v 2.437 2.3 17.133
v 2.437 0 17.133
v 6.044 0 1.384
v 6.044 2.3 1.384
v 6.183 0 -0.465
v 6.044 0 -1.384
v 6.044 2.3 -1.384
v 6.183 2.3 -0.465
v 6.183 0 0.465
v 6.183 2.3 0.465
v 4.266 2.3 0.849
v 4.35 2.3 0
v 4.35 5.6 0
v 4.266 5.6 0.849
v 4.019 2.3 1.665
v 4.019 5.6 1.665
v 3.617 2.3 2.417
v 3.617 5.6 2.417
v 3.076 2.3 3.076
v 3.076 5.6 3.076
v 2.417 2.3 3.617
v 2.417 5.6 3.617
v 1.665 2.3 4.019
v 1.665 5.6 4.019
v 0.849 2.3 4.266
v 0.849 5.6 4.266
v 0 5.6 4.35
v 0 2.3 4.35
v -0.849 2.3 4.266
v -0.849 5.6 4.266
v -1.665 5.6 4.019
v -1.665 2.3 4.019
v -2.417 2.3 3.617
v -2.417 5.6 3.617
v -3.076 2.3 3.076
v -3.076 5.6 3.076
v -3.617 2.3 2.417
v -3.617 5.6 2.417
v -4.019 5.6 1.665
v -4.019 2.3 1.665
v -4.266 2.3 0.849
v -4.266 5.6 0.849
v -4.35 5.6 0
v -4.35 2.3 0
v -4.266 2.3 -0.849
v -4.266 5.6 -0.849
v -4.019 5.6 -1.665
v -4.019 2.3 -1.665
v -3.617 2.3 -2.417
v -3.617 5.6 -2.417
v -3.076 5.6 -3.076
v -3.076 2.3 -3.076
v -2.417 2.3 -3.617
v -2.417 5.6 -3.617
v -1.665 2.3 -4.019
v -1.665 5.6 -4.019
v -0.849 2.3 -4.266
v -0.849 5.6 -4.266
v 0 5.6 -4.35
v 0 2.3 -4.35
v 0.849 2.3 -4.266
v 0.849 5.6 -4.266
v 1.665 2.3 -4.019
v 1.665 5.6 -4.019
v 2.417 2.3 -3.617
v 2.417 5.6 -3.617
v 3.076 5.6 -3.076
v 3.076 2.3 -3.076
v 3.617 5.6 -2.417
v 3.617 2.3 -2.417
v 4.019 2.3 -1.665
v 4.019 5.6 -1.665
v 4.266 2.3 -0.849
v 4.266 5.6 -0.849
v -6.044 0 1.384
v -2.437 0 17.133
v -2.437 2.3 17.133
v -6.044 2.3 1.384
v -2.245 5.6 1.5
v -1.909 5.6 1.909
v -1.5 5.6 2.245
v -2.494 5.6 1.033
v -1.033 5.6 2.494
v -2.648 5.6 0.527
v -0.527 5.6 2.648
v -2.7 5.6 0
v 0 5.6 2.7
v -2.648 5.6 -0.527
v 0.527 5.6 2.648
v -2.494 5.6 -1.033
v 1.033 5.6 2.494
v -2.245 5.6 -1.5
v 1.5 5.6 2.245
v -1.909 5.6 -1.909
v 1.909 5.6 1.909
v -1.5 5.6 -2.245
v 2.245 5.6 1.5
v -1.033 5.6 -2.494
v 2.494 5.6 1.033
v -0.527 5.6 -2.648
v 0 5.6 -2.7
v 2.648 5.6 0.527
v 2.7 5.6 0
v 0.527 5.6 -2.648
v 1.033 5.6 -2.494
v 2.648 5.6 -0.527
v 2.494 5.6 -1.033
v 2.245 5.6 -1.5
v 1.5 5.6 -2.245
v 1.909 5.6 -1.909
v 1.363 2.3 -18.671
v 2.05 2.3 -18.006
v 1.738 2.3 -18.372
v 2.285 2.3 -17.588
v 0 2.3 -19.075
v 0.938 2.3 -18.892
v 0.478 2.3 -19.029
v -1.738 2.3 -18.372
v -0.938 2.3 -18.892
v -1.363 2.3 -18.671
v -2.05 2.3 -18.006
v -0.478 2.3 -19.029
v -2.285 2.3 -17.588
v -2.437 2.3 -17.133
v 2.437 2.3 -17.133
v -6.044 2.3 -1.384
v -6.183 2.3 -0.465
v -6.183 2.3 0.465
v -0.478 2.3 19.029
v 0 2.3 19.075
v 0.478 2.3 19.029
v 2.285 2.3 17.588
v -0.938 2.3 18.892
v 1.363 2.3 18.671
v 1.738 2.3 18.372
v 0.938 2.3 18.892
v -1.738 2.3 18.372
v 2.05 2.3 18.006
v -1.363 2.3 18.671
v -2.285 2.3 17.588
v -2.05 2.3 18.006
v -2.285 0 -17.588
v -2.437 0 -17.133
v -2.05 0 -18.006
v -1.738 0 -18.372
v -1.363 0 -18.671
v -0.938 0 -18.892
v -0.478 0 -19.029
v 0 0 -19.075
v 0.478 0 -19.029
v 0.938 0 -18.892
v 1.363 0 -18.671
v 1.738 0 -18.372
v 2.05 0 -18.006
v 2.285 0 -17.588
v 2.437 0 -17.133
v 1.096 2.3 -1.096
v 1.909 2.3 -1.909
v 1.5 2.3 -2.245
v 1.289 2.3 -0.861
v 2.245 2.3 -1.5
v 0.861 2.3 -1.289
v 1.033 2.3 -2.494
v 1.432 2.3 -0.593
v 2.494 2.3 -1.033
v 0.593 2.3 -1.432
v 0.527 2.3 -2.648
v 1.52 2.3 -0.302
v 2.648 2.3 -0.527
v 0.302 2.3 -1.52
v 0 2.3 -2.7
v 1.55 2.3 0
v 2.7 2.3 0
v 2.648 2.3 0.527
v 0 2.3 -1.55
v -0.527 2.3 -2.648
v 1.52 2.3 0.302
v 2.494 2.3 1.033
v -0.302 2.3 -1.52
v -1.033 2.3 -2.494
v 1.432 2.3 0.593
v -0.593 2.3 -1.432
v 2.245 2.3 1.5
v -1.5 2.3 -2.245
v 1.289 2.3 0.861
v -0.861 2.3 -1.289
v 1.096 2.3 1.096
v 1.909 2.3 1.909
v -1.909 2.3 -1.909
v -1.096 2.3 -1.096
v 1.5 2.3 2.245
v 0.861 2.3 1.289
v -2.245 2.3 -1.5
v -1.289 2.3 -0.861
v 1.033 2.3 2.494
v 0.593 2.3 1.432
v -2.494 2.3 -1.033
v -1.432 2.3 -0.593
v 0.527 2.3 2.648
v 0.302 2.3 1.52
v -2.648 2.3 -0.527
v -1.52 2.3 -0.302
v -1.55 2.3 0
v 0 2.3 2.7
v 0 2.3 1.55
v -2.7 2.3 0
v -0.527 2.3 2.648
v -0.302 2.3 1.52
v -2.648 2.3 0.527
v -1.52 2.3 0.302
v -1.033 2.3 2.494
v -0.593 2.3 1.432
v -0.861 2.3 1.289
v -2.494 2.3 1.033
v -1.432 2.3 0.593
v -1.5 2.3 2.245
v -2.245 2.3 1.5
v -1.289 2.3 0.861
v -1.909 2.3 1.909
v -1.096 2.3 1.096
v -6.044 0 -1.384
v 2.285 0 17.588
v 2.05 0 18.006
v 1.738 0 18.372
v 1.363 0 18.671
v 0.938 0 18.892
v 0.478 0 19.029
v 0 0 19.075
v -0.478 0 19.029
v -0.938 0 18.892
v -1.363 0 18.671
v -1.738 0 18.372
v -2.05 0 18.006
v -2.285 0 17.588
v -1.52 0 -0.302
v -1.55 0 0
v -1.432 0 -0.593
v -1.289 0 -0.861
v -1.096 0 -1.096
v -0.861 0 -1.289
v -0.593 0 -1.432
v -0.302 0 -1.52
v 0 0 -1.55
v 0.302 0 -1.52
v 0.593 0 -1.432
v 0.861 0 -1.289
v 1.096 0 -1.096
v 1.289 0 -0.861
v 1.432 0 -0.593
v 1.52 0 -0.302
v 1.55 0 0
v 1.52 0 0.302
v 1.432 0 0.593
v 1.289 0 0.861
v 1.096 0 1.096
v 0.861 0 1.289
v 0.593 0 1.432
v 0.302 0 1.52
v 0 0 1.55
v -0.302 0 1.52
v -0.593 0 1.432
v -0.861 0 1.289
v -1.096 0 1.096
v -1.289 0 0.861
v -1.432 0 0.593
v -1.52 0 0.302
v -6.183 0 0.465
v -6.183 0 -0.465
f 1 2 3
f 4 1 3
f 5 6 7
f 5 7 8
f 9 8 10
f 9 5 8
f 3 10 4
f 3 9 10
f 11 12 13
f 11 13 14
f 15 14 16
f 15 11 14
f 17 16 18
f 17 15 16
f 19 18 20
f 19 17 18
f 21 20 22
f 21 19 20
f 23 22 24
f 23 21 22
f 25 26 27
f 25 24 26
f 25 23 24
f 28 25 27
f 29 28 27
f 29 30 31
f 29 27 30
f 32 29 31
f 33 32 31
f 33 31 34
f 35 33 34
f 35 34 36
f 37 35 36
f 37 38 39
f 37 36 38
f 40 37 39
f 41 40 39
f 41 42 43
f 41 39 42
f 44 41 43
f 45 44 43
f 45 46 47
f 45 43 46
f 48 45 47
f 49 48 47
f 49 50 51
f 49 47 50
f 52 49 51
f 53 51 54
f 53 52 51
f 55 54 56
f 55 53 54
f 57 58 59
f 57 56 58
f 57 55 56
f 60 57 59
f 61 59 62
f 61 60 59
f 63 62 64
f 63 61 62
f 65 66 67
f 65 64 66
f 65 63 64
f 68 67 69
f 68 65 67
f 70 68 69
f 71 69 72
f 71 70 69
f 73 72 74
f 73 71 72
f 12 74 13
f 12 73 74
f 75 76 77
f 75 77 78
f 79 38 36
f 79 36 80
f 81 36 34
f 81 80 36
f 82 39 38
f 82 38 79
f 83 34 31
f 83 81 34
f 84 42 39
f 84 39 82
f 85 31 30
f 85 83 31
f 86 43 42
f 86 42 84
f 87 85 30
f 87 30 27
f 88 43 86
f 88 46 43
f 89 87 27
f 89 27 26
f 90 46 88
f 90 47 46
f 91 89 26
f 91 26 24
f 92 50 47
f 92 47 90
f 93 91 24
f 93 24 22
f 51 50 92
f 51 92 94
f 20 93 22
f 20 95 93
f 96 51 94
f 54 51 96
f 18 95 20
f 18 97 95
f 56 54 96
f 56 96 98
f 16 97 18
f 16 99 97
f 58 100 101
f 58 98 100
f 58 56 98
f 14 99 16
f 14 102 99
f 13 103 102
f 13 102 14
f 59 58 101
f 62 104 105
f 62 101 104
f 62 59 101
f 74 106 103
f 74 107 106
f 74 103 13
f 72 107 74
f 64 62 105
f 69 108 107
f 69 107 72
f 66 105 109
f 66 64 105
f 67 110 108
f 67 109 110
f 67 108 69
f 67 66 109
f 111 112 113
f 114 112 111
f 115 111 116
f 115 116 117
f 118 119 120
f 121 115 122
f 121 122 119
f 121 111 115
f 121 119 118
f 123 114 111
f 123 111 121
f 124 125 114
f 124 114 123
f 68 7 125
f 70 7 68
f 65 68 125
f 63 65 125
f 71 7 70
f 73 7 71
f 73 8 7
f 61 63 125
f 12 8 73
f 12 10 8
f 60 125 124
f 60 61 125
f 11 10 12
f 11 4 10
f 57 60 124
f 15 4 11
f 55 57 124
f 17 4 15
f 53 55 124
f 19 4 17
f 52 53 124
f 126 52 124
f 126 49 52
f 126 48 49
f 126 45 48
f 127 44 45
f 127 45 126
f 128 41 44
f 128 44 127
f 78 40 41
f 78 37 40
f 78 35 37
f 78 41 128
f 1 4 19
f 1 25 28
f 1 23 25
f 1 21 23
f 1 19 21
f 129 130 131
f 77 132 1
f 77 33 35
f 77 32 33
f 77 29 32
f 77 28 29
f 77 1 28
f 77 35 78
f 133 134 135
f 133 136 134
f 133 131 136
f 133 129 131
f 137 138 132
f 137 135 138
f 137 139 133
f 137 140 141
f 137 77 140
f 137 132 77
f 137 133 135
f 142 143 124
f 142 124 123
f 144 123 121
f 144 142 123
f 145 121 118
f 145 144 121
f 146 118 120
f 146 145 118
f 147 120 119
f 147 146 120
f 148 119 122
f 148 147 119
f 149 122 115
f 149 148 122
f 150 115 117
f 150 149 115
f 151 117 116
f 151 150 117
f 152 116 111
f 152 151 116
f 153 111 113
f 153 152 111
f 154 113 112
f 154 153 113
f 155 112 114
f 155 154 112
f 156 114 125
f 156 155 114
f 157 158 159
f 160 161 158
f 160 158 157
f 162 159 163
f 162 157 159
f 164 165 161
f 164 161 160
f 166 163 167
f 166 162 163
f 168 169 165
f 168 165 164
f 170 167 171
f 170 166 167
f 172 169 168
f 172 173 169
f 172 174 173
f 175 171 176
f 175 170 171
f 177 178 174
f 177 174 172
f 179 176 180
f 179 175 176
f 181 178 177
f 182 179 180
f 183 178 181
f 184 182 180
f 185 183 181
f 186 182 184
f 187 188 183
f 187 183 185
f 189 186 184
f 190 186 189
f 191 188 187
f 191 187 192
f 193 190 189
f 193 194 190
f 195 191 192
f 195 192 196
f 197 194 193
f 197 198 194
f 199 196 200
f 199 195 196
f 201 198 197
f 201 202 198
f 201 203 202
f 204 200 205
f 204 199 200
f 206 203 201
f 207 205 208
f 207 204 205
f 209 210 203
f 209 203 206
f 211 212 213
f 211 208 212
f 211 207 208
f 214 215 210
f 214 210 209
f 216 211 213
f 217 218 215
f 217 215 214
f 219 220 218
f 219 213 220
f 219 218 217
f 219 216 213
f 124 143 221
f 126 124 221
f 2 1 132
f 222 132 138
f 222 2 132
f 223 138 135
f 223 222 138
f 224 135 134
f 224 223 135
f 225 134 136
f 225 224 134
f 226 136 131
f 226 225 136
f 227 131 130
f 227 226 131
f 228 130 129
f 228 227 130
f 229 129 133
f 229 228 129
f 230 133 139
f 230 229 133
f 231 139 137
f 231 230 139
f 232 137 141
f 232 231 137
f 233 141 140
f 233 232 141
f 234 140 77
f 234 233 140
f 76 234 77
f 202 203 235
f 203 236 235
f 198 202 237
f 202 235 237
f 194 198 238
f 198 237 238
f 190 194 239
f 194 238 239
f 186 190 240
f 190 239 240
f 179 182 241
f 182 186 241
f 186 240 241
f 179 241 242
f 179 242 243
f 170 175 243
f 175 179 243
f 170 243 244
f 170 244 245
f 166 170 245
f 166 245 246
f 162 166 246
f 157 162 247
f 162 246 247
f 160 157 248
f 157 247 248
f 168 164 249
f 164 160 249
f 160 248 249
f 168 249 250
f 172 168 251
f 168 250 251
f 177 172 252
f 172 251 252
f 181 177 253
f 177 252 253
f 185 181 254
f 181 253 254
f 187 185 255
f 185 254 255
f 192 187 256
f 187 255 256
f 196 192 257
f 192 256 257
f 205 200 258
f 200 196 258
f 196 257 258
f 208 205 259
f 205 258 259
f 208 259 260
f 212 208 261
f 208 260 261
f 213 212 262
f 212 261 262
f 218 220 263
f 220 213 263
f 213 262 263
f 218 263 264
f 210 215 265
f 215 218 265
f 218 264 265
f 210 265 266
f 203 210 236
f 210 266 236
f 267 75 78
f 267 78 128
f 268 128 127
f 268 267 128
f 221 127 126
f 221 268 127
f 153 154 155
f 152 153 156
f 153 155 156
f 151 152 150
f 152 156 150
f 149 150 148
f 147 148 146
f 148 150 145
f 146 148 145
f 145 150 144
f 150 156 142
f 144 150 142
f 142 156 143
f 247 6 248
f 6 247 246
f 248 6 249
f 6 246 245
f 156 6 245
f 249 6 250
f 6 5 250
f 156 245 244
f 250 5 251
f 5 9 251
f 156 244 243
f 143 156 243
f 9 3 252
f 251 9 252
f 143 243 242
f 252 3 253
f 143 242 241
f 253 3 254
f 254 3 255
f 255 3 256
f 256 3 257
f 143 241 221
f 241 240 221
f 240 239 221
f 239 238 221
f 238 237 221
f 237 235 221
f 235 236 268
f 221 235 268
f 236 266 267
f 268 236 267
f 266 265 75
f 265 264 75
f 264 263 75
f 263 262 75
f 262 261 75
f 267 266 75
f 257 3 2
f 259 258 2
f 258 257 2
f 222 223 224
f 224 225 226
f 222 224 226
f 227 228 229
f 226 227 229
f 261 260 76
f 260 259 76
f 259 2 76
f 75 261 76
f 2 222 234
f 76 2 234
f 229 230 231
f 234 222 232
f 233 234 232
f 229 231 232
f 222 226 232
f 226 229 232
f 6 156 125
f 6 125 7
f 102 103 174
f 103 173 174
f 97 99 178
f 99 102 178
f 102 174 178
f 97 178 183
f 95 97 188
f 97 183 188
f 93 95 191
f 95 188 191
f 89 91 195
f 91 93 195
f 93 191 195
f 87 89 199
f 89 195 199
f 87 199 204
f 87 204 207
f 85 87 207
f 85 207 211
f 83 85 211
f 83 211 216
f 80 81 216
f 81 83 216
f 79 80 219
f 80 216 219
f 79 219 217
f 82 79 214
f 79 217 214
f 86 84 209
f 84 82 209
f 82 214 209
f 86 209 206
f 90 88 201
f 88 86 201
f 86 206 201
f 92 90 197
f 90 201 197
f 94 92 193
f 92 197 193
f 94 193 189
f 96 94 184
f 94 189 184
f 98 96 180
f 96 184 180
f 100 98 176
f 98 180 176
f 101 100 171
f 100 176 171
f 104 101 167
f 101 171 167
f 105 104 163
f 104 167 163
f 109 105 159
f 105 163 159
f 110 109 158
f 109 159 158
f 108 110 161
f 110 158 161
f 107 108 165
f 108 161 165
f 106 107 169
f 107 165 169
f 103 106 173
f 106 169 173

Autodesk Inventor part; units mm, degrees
ref_plane "YZ Plane" through (0, 0, 0) normal (1, 0, 0) x (0, 1, 0)
ref_plane "XZ Plane" through (0, 0, 0) normal (0, 1, 0) x (-1, 0, 0)
ref_plane "XY Plane" through (0, 0, 0) normal (0, 0, 1) x (1, 0, 0)
sketch "Boceto1" plane through (0, 0, 0) normal (0, 1, 0) x (-1, 0, 0)
  circle A0 centre (0, 0) radius 1.55
  line L0 (0, 0) -> (0, -1.55)
  line L1 (0, -19.075) -> (0, -14.075)
  line L2 (0, 19.075) -> (0, 16.575)
  arc A1 (2.4369, 17.1331) -> (-2.4369, 17.1331) centre (0, 16.575) ccw
  line L3 (0, -19.075) -> (0, -16.575)
  arc A2 (-2.4369, -17.1331) -> (2.4369, -17.1331) centre (0, -16.575) ccw
  line L4 (-2.4369, 17.1331) -> (-6.0436, 1.384)
  line L5 (2.4369, 17.1331) -> (6.0436, 1.384)
  line L6 (2.4369, -17.1331) -> (6.0436, -1.384)
  line L7 (-2.4369, -17.1331) -> (-6.0436, -1.384)
  arc A3 (-6.0436, 1.384) -> (-6.0436, -1.384) centre (0, 0) ccw
  arc A4 (6.0436, -1.384) -> (6.0436, 1.384) centre (0, 0) ccw
  dimension "d0" = 3.1
  dimension "d2" = 19.075
  dimension "d3" = 38.15
  dimension "d4" = 2.5
  dimension "d5" = 2.5
extrude "Extrusión1" add sketch "Boceto1" along normal blind 2.3
sketch "Boceto2" plane through (0, 2.3, 0) normal (0, 1, 0) x (1, 0, 0)
  circle A0 centre (0, 0) radius 1.55 projected
  circle A1 centre (0, 0) radius 4.35
  circle A2 centre (0, 0) radius 2.7
  dimension "d8" = 8.7
  dimension "d9" = 5.4
extrude "Extrusión2" add sketch "Boceto2" along normal blind 3.3 contours A1
sketch "Boceto3" plane through (0, 0, 0) normal (0, -1, 0) x (1, 0, 0)
  circle A0 centre (0, 0) radius 1.55 projected
  line L0 (0, -1.55) -> (0, 1.55)
properties part number "Brazo"
